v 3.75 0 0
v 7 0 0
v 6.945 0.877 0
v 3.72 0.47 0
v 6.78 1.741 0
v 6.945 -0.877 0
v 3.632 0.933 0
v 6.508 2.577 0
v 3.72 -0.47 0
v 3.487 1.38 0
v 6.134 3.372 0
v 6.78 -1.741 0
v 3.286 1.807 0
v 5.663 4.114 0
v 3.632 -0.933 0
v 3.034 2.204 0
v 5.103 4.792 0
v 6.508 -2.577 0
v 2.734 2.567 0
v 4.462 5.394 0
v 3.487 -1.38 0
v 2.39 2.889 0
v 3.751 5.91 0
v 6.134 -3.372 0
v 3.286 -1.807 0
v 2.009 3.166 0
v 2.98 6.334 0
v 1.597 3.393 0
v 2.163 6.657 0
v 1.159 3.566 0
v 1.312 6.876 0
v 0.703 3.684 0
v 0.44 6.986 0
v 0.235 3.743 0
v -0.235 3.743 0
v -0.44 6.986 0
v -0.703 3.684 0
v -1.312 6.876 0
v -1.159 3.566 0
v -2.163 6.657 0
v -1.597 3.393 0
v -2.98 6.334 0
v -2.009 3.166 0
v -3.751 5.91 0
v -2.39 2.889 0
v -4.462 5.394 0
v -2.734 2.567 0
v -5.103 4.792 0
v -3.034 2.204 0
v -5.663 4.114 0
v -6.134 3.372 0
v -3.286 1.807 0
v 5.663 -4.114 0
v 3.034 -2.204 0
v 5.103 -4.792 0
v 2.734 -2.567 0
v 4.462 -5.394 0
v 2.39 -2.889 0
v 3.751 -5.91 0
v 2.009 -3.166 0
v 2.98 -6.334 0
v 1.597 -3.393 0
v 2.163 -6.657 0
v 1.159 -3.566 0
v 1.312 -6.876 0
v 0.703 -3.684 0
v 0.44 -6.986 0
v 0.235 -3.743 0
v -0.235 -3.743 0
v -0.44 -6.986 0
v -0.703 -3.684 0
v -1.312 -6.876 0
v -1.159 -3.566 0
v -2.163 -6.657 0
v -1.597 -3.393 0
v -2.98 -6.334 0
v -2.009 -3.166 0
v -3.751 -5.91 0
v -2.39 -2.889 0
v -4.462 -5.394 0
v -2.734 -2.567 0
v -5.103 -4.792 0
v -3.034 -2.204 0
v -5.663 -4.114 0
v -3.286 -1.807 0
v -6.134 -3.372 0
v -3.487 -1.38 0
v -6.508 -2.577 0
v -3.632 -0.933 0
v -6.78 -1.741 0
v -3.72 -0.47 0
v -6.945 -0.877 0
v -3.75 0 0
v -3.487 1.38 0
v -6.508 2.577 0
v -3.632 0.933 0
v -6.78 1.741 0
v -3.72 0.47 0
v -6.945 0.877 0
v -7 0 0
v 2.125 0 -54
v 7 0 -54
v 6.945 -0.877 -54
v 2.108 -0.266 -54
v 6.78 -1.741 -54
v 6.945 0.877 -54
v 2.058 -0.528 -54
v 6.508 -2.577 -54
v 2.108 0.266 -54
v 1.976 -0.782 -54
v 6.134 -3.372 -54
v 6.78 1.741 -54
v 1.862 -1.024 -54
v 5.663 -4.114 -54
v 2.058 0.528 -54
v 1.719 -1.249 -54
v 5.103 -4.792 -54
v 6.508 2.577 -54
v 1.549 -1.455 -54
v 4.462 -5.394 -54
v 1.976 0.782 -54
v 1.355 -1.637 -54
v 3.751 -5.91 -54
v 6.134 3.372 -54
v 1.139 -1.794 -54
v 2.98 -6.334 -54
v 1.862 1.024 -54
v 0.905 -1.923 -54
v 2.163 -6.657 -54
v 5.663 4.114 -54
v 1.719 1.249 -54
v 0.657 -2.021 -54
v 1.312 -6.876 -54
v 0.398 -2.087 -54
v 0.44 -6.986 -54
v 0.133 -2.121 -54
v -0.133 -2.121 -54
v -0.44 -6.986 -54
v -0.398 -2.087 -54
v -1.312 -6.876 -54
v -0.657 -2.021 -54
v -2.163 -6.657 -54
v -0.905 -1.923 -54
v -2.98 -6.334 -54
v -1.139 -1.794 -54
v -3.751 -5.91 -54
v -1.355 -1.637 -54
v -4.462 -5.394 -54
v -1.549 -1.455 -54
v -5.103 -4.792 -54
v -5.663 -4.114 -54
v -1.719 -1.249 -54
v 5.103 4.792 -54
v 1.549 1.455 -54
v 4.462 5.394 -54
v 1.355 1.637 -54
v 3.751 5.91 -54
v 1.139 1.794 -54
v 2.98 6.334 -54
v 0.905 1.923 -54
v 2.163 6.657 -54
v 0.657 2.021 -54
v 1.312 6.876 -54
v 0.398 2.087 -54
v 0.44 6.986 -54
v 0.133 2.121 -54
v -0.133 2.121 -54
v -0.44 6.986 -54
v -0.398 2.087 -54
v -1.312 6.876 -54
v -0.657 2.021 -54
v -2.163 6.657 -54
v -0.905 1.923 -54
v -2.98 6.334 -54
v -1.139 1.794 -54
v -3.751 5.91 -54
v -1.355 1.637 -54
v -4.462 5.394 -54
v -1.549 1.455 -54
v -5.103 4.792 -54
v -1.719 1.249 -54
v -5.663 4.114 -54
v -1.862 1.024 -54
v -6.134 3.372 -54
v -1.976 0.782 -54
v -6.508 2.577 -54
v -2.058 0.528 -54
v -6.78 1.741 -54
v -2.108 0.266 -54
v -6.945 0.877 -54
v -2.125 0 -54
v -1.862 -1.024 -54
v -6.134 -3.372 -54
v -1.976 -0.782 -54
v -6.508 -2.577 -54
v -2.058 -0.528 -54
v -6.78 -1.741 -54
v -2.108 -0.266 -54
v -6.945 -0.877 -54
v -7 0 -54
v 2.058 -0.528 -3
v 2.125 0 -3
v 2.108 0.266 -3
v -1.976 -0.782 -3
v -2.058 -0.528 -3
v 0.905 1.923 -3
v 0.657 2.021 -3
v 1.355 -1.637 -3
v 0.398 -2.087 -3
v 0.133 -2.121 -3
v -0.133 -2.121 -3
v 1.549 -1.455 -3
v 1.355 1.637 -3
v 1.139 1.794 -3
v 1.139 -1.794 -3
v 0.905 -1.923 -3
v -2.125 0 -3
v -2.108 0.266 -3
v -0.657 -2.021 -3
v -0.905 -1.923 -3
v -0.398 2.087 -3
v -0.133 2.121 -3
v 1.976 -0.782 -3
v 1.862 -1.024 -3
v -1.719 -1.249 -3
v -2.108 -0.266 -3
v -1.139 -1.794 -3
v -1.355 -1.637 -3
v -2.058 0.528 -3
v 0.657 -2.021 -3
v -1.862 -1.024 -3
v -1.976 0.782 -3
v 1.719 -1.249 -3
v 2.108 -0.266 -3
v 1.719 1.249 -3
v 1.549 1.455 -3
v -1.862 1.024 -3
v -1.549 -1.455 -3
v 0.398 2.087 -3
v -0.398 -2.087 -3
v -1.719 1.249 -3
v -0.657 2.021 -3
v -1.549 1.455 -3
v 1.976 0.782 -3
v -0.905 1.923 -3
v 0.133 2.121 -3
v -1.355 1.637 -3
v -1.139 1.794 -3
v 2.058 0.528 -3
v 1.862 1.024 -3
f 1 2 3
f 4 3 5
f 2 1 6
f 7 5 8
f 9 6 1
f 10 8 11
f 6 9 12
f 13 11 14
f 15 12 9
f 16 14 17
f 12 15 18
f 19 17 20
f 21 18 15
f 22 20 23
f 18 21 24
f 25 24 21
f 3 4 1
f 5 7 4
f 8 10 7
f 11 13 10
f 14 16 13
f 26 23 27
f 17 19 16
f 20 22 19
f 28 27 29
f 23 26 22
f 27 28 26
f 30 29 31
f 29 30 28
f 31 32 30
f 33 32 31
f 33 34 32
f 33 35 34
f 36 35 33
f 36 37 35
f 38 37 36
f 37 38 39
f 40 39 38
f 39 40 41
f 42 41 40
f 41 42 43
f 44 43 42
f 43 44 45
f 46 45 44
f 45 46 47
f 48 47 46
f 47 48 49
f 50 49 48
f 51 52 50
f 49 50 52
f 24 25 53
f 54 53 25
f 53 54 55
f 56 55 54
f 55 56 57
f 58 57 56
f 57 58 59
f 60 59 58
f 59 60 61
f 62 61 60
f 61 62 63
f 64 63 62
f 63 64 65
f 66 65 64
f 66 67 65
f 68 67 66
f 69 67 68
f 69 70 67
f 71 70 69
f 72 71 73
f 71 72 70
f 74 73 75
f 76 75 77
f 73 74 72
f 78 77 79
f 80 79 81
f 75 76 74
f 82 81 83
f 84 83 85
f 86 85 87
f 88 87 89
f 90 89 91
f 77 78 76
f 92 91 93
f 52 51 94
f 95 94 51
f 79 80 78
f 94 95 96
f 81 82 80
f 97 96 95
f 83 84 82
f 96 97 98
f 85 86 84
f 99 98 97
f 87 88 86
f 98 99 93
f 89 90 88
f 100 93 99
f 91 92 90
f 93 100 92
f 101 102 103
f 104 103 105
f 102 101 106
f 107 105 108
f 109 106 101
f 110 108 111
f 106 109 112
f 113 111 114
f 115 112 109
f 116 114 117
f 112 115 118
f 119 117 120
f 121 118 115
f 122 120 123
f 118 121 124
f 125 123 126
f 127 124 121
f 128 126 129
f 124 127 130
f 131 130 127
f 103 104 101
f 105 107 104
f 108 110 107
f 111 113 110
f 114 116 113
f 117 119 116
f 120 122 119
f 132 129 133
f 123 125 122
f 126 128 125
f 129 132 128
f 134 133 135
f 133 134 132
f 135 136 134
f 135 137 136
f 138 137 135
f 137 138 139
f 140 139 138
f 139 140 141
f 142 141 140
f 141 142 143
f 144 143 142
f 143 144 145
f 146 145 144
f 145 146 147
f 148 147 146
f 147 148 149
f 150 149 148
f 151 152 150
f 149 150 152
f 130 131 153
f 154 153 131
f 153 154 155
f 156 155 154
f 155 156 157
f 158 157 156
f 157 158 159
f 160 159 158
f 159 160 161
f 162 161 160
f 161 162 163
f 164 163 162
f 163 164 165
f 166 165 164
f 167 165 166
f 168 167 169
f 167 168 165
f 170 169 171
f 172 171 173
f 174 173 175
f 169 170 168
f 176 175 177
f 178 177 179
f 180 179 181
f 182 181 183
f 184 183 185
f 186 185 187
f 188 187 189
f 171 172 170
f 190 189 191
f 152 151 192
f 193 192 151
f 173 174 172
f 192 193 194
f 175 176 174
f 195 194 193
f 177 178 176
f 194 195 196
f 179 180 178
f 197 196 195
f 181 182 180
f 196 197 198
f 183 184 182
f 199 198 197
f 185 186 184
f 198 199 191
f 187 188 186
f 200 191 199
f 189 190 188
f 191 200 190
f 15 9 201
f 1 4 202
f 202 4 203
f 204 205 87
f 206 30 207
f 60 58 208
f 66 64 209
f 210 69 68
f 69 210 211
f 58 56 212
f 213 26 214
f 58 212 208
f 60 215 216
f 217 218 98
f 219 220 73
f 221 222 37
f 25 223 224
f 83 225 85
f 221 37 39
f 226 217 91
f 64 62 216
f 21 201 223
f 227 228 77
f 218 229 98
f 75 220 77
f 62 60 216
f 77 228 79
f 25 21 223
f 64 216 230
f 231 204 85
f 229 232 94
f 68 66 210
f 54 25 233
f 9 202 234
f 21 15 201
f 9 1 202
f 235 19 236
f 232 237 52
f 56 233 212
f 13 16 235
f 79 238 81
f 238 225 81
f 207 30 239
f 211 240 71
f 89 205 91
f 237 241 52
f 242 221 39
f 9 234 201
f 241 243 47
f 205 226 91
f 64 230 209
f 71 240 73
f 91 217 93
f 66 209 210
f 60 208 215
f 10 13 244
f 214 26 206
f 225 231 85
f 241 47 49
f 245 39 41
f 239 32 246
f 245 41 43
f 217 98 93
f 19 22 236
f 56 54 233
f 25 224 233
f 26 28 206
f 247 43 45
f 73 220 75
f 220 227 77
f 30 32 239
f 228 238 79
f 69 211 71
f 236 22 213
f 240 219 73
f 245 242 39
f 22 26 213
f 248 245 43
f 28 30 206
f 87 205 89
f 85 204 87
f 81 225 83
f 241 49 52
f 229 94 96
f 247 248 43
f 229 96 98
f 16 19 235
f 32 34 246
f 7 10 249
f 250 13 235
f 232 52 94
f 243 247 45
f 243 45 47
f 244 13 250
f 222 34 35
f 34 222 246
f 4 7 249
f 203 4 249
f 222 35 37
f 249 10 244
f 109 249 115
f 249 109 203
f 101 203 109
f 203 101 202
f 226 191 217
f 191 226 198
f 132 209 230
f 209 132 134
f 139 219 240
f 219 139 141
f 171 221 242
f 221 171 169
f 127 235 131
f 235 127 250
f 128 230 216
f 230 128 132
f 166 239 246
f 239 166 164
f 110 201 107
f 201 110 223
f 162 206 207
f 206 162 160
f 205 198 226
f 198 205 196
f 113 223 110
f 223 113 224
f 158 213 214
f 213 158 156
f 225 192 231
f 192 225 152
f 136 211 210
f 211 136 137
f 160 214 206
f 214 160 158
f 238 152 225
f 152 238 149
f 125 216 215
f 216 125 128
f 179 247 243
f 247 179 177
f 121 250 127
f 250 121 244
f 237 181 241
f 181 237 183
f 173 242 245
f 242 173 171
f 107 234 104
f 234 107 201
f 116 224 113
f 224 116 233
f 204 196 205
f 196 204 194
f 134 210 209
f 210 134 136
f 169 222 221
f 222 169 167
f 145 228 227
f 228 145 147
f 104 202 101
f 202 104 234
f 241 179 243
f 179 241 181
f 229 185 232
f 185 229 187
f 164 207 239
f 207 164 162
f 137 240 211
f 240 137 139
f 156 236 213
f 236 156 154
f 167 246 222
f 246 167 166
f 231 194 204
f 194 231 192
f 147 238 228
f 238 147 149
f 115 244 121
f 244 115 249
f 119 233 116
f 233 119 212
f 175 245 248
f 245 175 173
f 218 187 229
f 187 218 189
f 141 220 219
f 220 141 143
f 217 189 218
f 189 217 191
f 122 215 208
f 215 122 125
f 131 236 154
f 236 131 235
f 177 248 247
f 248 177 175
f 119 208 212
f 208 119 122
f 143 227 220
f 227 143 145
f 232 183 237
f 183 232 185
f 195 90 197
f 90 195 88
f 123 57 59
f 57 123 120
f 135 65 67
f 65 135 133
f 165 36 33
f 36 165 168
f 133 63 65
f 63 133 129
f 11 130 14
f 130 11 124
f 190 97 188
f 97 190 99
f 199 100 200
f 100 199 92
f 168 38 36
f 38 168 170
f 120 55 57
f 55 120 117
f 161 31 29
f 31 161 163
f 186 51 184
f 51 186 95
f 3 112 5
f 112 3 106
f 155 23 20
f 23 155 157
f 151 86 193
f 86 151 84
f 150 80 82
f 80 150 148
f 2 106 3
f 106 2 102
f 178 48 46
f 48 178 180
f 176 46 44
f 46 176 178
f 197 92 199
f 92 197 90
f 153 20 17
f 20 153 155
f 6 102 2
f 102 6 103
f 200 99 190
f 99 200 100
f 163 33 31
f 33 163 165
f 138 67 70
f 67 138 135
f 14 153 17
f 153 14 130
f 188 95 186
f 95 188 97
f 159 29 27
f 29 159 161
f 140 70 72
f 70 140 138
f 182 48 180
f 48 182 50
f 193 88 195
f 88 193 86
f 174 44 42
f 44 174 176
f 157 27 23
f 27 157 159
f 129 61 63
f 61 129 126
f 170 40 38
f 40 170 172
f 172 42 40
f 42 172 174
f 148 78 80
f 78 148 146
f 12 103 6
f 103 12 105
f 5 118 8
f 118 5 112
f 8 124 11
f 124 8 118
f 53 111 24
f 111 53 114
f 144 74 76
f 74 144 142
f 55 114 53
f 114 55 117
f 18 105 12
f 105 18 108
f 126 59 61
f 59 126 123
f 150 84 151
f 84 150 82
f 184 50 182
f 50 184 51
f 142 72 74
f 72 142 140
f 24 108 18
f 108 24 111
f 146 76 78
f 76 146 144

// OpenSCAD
$fn = 50;


difference() {
	union() {
		translate(v = [0, 0, -54.0000000000]) {
			cylinder(h = 54, r = 7.0000000000);
		}
		cylinder(h = 0, r = 16.0000000000);
	}
	union() {
		translate(v = [0, 0, 0]) {
			rotate(a = [0, 0, 0]) {
				difference() {
					union() {
						#translate(v = [0, 0, -54.0000000000]) {
							cylinder(h = 54, r = 2.0000000000);
						}
						#translate(v = [0, 0, -3]) {
							cylinder(h = 3, r = 7.0000000000, r1 = 2.1250000000, r2 = 3.7500000000);
						}
						#translate(v = [0, 0, -54.0000000000]) {
							cylinder(h = 54, r = 2.1250000000);
						}
						#translate(v = [0, 0, -54.0000000000]) {
							cylinder(h = 54, r = 2.0000000000);
						}
					}
					union();
				}
			}
		}
	}
}
